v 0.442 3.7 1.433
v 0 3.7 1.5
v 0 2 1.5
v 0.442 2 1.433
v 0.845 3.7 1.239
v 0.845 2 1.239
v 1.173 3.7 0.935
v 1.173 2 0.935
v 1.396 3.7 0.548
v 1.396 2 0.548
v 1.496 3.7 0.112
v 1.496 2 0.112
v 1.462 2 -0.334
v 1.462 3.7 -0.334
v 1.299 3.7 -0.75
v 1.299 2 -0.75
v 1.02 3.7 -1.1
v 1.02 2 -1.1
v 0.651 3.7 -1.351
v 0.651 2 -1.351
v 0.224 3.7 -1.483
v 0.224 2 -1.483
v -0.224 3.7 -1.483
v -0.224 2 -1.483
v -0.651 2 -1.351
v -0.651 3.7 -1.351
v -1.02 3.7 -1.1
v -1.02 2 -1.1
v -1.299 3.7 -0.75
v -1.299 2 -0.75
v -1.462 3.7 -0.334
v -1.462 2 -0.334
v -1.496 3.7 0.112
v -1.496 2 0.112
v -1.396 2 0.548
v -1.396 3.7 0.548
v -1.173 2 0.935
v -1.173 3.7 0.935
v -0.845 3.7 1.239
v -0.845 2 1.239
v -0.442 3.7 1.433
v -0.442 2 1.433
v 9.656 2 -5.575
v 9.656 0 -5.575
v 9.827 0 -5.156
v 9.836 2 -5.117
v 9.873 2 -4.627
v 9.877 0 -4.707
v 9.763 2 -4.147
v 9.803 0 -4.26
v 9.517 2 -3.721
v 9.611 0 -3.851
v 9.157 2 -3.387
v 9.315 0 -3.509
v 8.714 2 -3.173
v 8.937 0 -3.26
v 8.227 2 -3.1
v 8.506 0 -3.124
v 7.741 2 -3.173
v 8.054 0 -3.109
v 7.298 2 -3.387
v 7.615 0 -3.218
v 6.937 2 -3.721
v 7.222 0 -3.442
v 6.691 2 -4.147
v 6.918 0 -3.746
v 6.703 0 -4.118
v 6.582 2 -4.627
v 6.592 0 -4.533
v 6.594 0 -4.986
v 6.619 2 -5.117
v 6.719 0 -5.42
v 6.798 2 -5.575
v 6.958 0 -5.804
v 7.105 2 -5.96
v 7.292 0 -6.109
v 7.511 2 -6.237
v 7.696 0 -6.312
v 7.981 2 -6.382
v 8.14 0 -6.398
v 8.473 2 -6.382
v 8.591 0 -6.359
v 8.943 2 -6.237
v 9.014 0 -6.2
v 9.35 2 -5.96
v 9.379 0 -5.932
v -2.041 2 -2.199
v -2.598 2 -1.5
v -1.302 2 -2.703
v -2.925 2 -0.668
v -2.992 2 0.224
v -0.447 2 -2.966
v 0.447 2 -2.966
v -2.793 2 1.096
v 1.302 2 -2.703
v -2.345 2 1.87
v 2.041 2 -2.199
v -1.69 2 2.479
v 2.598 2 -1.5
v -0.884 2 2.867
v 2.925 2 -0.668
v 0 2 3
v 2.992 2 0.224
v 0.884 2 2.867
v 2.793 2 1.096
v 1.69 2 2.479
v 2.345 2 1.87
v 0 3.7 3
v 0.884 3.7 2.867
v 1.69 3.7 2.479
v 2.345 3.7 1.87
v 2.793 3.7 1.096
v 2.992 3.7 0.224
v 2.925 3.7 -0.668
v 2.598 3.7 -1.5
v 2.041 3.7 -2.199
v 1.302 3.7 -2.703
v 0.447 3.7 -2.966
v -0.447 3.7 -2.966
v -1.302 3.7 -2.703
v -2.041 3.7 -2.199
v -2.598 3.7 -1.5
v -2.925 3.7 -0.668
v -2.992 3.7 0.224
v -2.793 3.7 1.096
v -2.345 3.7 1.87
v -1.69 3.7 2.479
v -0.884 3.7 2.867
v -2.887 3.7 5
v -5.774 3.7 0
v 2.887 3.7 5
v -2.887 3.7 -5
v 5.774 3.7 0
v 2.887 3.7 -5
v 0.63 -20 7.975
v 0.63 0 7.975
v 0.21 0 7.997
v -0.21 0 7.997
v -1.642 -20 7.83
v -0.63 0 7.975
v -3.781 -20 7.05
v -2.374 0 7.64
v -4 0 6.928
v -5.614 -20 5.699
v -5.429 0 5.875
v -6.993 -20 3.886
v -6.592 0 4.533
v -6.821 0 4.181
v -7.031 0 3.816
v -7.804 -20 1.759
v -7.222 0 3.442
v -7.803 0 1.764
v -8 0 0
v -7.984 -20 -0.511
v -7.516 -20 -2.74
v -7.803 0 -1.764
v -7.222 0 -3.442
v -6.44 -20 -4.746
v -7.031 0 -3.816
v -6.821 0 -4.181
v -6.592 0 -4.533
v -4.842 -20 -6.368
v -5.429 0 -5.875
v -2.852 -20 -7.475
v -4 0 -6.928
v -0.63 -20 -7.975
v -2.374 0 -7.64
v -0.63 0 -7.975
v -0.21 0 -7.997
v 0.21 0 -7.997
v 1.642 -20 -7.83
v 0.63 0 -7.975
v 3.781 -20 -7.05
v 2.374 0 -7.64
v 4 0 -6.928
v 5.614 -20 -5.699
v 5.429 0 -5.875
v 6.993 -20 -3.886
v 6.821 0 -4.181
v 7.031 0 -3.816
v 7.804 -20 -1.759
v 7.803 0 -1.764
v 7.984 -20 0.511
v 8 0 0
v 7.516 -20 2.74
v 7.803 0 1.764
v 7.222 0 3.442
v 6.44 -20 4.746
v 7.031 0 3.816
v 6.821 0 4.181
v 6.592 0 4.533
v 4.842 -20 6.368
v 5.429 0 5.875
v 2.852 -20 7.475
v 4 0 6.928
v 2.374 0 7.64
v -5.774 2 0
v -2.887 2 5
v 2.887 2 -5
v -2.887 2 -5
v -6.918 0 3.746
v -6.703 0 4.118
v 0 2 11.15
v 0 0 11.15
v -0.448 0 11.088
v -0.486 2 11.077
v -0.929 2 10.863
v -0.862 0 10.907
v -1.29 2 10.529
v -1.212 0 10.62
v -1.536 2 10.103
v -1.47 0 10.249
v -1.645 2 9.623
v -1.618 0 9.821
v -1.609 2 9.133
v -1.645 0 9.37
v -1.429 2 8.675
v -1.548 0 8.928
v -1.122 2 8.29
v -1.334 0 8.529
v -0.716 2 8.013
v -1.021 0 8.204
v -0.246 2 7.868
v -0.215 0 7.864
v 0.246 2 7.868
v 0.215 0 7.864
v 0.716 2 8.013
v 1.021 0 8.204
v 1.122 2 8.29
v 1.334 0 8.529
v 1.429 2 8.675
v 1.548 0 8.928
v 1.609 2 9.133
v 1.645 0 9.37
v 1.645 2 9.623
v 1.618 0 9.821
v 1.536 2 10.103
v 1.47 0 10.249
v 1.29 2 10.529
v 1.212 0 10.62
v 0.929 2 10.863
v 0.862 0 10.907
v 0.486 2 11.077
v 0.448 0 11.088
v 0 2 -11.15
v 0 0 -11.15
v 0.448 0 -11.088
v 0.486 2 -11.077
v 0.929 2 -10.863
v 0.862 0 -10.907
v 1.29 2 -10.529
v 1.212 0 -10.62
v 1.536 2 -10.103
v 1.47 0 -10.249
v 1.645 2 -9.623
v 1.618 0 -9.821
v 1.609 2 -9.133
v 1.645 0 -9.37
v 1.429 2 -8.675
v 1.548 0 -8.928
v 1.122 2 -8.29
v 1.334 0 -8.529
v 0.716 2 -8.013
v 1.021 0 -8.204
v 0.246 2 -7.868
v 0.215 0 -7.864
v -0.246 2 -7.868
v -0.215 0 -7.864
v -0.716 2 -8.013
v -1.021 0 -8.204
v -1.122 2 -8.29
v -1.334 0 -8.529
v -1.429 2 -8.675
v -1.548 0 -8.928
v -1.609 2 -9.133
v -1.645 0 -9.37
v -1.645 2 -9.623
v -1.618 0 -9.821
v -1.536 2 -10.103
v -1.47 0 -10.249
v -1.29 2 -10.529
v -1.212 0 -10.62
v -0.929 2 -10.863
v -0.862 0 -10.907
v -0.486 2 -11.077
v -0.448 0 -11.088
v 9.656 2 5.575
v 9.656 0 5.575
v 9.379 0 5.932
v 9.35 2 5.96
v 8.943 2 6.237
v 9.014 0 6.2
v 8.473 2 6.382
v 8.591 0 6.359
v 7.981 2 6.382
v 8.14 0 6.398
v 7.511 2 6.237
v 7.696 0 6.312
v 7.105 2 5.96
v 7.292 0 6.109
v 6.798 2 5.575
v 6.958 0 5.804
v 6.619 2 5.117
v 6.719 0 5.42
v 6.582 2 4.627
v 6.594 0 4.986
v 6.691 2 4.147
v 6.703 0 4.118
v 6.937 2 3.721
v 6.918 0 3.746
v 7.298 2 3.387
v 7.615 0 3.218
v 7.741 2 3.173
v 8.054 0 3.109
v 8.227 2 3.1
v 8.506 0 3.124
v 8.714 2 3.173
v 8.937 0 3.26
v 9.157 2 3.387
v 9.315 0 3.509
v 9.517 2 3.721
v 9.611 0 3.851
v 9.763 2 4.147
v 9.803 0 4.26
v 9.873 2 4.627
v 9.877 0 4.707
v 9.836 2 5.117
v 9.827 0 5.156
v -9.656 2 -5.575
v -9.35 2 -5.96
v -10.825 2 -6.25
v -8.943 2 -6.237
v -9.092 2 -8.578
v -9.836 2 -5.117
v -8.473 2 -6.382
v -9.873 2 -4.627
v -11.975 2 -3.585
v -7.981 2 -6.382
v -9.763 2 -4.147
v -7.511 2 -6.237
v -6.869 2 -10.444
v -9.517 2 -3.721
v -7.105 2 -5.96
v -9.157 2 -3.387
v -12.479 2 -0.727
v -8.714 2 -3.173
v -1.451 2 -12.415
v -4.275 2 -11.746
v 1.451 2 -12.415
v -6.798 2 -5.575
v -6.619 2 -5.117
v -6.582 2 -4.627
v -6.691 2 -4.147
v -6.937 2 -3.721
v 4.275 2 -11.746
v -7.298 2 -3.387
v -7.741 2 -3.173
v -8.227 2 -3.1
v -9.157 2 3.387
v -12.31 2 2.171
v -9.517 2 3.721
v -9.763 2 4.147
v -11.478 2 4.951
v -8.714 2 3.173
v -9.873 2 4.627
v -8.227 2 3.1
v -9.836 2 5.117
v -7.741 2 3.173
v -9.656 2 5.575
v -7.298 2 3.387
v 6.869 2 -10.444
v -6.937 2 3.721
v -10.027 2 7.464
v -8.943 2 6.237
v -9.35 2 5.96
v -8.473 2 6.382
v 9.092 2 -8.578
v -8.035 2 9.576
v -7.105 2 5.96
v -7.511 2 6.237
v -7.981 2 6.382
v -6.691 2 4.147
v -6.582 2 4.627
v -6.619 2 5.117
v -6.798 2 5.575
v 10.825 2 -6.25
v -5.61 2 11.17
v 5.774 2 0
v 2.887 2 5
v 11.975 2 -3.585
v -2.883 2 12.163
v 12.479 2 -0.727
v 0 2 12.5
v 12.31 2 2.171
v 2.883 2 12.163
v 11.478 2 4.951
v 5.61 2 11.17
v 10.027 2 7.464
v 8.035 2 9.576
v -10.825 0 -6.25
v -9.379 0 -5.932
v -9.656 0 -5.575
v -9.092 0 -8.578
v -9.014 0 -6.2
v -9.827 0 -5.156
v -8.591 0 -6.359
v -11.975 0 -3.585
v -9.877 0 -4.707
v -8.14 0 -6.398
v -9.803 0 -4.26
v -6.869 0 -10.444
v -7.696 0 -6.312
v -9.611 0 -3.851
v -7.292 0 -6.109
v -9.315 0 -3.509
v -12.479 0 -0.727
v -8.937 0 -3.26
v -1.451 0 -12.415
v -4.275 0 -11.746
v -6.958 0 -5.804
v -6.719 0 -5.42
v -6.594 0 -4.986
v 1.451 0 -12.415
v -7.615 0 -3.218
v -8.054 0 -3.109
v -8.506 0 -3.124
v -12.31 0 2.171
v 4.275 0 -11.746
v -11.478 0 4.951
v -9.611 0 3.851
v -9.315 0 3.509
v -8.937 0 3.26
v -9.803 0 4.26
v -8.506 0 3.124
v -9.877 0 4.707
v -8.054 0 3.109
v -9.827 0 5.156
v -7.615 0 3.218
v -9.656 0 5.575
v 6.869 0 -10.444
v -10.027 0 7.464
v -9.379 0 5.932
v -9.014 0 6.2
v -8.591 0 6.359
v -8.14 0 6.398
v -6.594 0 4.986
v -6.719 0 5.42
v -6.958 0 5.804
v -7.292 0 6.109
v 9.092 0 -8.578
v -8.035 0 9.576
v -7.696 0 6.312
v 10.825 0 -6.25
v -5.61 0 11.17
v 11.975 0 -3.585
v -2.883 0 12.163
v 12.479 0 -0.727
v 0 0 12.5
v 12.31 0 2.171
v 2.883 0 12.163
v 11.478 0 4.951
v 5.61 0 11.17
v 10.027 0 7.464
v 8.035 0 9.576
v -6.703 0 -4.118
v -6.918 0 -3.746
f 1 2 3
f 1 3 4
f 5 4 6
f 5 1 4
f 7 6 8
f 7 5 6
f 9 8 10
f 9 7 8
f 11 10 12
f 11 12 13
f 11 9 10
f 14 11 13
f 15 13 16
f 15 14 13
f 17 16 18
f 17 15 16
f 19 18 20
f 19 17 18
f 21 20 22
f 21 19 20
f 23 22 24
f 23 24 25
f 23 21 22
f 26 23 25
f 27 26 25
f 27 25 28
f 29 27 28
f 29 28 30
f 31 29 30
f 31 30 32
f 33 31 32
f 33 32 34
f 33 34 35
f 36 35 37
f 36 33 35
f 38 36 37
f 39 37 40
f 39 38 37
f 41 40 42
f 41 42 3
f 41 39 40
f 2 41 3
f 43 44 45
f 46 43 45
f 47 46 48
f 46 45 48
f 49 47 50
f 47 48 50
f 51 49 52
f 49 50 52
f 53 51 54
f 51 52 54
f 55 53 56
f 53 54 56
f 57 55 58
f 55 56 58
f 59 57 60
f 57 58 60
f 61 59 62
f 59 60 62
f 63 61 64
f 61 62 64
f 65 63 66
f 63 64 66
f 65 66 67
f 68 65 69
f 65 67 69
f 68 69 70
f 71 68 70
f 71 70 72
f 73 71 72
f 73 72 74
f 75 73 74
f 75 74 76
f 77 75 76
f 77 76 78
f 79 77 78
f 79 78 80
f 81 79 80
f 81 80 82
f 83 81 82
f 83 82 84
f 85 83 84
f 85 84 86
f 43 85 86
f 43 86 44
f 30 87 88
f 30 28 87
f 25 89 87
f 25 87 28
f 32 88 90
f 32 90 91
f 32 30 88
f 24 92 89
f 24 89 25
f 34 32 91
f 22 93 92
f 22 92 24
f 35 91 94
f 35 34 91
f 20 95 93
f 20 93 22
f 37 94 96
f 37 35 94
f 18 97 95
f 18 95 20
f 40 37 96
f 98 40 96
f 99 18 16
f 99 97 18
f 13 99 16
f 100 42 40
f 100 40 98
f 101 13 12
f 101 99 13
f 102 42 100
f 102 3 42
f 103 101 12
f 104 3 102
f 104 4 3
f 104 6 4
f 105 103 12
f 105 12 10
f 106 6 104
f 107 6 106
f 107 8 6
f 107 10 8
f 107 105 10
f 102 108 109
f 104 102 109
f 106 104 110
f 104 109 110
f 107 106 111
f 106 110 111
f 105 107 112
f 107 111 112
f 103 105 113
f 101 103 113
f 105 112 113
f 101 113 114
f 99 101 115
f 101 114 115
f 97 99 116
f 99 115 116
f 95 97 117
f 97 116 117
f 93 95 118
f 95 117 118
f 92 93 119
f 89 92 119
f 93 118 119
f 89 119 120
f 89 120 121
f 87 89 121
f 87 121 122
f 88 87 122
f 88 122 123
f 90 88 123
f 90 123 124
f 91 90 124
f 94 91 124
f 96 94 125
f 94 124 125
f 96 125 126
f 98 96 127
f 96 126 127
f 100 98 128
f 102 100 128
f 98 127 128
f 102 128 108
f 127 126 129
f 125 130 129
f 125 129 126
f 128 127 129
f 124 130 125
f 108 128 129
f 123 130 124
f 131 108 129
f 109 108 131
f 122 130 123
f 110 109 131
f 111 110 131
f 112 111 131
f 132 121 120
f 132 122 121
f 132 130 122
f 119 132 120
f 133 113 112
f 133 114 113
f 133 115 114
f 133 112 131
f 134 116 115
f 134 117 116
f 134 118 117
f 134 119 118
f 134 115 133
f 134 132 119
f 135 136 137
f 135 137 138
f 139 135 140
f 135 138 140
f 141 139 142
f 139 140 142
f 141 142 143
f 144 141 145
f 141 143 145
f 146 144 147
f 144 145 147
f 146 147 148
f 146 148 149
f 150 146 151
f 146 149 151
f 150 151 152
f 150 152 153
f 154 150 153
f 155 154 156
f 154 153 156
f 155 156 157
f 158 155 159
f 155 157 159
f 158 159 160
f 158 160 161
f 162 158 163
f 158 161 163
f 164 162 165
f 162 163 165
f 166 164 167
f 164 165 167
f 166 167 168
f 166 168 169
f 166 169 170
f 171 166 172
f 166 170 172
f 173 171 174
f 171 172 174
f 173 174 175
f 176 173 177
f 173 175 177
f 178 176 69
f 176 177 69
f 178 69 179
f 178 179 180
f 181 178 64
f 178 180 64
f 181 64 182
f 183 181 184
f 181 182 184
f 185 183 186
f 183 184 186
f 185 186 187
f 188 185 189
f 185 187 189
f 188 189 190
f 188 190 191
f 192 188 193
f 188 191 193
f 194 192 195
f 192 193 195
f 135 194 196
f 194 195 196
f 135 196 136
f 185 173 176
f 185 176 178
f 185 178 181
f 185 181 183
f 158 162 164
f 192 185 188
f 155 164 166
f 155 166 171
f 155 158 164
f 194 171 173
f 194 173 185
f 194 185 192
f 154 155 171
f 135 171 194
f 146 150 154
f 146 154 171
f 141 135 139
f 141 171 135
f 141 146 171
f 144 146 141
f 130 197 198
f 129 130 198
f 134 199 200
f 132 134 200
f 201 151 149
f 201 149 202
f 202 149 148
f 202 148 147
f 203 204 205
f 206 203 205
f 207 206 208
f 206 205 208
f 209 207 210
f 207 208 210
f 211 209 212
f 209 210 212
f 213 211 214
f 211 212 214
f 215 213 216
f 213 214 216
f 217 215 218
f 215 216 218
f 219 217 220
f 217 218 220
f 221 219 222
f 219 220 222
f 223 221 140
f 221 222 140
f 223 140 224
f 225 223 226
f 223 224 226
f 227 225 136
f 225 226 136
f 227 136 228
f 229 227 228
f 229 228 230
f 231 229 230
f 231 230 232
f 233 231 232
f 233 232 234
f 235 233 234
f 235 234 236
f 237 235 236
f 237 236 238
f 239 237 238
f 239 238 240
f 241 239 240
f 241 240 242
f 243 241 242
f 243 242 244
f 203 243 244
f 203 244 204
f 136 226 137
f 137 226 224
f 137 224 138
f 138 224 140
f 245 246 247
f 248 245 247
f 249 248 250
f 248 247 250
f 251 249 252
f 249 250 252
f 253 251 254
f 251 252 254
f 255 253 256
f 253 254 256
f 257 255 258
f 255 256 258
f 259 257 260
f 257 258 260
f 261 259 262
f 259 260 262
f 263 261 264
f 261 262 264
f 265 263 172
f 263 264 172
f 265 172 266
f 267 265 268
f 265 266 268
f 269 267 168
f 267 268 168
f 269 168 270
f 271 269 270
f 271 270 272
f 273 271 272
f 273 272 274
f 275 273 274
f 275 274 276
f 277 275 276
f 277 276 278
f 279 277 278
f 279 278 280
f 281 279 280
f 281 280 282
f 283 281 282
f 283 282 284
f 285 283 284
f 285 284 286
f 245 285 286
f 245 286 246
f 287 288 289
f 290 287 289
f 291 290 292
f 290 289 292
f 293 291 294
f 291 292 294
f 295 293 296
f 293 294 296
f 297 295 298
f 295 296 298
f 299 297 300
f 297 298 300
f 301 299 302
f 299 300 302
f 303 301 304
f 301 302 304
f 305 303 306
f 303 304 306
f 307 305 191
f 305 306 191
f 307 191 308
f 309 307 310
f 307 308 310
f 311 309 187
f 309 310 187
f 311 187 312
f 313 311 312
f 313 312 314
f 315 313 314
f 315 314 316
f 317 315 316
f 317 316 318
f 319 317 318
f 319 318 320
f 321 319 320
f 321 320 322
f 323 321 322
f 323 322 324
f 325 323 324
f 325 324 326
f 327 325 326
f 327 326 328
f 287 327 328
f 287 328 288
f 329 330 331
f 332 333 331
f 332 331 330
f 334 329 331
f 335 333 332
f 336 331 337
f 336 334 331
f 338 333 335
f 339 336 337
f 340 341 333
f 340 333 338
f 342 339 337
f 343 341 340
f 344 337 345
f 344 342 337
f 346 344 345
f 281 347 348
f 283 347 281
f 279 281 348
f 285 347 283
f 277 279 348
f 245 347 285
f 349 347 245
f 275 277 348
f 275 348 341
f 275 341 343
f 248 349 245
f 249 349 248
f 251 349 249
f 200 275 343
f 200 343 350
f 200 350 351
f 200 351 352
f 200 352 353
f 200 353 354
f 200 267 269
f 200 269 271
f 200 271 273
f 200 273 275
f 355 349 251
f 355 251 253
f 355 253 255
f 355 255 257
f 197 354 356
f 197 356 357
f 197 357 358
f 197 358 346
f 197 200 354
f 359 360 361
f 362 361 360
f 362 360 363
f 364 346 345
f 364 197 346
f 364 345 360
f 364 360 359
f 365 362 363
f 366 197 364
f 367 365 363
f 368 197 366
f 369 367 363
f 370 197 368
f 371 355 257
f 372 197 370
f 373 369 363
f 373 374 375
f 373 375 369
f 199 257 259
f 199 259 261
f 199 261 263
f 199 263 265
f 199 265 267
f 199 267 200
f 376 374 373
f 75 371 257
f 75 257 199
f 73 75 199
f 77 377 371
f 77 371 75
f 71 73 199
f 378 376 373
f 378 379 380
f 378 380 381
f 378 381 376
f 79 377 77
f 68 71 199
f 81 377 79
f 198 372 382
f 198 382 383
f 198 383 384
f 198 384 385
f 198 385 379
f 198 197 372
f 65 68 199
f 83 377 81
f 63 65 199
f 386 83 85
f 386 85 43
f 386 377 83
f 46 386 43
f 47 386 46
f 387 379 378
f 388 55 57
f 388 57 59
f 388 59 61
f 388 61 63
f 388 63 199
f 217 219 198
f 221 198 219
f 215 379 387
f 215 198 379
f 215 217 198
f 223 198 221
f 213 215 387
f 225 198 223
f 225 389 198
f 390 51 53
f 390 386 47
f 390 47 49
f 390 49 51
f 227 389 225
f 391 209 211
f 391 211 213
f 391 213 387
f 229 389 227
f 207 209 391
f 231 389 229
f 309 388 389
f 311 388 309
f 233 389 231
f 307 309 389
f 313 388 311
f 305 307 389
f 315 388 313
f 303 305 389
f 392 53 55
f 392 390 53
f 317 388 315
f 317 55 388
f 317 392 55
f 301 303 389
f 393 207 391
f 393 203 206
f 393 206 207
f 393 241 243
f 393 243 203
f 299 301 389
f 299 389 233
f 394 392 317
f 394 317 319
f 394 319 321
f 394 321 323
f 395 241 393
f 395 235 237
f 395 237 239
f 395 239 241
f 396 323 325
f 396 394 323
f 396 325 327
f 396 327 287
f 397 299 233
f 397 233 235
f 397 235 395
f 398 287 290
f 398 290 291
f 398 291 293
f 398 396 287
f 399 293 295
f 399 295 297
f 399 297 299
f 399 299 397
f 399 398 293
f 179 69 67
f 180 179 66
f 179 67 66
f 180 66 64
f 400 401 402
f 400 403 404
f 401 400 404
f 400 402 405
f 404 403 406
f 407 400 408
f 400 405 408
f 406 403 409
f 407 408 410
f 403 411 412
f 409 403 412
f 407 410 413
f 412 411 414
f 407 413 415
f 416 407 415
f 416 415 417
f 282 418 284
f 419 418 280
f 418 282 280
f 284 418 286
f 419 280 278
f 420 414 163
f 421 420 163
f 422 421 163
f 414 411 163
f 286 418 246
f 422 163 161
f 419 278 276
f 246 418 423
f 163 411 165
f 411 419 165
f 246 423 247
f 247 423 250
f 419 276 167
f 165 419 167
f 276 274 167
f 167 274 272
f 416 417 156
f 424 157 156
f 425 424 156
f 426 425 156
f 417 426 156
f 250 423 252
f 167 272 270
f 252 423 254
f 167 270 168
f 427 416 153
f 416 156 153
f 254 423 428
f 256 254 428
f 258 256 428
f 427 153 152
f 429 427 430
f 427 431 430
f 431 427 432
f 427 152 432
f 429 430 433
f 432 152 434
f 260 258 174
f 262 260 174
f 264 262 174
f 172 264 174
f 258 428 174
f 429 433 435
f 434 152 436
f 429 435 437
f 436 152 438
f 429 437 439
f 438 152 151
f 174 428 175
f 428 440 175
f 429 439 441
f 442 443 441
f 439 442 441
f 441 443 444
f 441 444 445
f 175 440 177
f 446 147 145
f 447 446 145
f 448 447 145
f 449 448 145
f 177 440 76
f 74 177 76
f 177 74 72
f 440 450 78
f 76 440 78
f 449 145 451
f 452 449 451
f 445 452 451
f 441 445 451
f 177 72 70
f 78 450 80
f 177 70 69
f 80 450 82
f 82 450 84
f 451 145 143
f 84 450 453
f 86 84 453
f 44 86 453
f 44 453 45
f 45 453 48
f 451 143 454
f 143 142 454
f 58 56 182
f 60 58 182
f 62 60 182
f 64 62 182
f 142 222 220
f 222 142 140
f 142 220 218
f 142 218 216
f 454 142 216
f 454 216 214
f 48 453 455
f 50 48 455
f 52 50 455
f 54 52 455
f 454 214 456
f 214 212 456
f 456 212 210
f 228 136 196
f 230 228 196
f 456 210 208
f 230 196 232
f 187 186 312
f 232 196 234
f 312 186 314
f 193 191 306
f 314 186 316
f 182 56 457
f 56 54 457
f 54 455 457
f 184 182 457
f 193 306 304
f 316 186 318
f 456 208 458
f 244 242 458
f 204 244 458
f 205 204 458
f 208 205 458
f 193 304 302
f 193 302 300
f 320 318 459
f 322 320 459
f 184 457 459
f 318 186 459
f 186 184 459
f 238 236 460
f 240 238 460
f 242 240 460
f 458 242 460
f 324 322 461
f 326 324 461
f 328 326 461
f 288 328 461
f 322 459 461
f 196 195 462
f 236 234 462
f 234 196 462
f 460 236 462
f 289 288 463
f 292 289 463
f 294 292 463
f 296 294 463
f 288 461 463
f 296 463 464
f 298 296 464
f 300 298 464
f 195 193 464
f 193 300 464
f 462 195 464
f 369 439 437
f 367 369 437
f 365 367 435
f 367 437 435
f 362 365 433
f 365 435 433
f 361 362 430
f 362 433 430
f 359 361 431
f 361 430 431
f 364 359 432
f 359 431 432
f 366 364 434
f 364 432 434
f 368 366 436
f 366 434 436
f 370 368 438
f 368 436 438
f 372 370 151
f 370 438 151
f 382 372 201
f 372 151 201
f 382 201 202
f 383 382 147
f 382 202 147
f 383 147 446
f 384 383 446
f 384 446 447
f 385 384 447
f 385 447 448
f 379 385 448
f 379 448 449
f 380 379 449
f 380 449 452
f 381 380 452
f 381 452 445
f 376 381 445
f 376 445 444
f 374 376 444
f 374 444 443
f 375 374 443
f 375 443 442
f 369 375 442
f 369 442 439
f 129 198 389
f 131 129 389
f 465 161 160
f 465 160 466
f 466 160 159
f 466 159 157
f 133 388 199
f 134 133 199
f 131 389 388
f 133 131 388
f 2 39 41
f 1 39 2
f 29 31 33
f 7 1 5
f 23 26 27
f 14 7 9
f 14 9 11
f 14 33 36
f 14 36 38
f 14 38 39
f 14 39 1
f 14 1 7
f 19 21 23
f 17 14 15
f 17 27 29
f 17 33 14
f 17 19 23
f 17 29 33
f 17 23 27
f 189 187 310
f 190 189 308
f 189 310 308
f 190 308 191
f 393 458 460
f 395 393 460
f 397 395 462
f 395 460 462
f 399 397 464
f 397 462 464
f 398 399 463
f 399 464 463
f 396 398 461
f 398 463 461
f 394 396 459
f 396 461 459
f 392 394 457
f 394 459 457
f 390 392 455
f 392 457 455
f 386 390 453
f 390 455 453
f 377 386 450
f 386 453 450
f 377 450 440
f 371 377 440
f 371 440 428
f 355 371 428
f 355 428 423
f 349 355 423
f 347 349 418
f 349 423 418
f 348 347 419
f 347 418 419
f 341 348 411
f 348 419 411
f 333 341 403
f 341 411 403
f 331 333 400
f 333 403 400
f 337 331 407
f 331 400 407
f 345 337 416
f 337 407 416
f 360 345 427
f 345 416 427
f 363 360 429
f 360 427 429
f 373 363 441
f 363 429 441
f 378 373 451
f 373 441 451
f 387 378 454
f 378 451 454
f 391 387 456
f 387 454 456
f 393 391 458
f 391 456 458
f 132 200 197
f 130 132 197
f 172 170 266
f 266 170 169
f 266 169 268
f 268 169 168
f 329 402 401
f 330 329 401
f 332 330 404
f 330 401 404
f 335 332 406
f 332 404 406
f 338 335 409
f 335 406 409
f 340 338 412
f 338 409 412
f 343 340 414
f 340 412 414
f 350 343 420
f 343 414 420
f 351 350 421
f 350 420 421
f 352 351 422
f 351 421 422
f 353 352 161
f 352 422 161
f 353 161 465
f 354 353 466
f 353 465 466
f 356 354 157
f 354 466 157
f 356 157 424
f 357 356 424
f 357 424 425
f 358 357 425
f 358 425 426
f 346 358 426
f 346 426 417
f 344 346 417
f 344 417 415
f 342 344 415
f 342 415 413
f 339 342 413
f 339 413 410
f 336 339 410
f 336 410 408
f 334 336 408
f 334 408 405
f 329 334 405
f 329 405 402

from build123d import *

# Parameters (mm, degrees)
SKETCH_1_R               = 12.5
EXTRUDE_1_DEPTH          = 2
SKETCH_2_R               = 1.65
CUT_EXTRUDE_1_DEPTH      = 18.790446875
PATTERN_CIRCULAR_1_COUNT = 6
SKETCH_3_R               = 8
EXTRUDE_2_DEPTH          = 20
EXTRUDE_3_DEPTH          = 1.7
SKETCH_5_R               = 3
SKETCH_5_R_2             = 1.5
CUT_EXTRUDE_2_DEPTH      = 1.7


with BuildPart() as part:
    # Эскиз1 → Бобышка-Вытянуть1 (new body)
    with BuildSketch(Plane(origin=(0, 0, 0), x_dir=(1, 0, 0), z_dir=(0, 1, 0))):
        with Locations(Location((0, 0, 0), (0, 0, 270))):
            Circle(SKETCH_1_R)
    extrude(amount=EXTRUDE_1_DEPTH)

    # Эскиз2 → Вырез-Вытянуть1 (cut, through all)
    with BuildSketch(Plane.XZ):
        with Locations(Location((0, -9.5, 0), (0, 0, 270))):
            Circle(SKETCH_2_R)
    cut_extrude_1 = extrude(amount=-CUT_EXTRUDE_1_DEPTH, mode=Mode.SUBTRACT)

    # Круговой массив1: Вырез-Вытянуть1 ×6 about axis
    pattern_circular_1_axis = Axis((0, 0, 0), (0, 1, 0))
    for i in range(1, PATTERN_CIRCULAR_1_COUNT):
        add(cut_extrude_1.rotate(pattern_circular_1_axis, i * 360 / PATTERN_CIRCULAR_1_COUNT), mode=Mode.SUBTRACT)

    # Эскиз3 → Бобышка-Вытянуть2 (add)
    with BuildSketch(Plane.XZ):
        with Locations(Location((0, 0, 0), (0, 0, 85.481135603))):
            Circle(SKETCH_3_R)
    extrude(amount=EXTRUDE_2_DEPTH)

    # Эскиз4 → Бобышка-Вытянуть3 (add)
    with BuildSketch(Plane(origin=(0, 2, 0), x_dir=(1, 0, 0), z_dir=(0, 1, 0))):
        Polygon((-5.773502692, 0), (-2.886751346, -5), (2.886751346, -5), (5.773502692, 0), (2.886751346, 5), (-2.886751346, 5), align=None)
    extrude(amount=EXTRUDE_3_DEPTH)

    # Эскиз5 → Вырез-Вытянуть2 (cut)
    with BuildSketch(Plane(origin=(0, 3.7, 0), x_dir=(1, 0, 0), z_dir=(0, 1, 0))):
        with Locations(Location((0, 0, 0), (0, 0, 270))):
            Circle(SKETCH_5_R)
        with Locations(Location((0, 0, 0), (0, 0, 270))):
            Circle(SKETCH_5_R_2, mode=Mode.SUBTRACT)
    extrude(amount=-CUT_EXTRUDE_2_DEPTH, mode=Mode.SUBTRACT)


solid = part.part
